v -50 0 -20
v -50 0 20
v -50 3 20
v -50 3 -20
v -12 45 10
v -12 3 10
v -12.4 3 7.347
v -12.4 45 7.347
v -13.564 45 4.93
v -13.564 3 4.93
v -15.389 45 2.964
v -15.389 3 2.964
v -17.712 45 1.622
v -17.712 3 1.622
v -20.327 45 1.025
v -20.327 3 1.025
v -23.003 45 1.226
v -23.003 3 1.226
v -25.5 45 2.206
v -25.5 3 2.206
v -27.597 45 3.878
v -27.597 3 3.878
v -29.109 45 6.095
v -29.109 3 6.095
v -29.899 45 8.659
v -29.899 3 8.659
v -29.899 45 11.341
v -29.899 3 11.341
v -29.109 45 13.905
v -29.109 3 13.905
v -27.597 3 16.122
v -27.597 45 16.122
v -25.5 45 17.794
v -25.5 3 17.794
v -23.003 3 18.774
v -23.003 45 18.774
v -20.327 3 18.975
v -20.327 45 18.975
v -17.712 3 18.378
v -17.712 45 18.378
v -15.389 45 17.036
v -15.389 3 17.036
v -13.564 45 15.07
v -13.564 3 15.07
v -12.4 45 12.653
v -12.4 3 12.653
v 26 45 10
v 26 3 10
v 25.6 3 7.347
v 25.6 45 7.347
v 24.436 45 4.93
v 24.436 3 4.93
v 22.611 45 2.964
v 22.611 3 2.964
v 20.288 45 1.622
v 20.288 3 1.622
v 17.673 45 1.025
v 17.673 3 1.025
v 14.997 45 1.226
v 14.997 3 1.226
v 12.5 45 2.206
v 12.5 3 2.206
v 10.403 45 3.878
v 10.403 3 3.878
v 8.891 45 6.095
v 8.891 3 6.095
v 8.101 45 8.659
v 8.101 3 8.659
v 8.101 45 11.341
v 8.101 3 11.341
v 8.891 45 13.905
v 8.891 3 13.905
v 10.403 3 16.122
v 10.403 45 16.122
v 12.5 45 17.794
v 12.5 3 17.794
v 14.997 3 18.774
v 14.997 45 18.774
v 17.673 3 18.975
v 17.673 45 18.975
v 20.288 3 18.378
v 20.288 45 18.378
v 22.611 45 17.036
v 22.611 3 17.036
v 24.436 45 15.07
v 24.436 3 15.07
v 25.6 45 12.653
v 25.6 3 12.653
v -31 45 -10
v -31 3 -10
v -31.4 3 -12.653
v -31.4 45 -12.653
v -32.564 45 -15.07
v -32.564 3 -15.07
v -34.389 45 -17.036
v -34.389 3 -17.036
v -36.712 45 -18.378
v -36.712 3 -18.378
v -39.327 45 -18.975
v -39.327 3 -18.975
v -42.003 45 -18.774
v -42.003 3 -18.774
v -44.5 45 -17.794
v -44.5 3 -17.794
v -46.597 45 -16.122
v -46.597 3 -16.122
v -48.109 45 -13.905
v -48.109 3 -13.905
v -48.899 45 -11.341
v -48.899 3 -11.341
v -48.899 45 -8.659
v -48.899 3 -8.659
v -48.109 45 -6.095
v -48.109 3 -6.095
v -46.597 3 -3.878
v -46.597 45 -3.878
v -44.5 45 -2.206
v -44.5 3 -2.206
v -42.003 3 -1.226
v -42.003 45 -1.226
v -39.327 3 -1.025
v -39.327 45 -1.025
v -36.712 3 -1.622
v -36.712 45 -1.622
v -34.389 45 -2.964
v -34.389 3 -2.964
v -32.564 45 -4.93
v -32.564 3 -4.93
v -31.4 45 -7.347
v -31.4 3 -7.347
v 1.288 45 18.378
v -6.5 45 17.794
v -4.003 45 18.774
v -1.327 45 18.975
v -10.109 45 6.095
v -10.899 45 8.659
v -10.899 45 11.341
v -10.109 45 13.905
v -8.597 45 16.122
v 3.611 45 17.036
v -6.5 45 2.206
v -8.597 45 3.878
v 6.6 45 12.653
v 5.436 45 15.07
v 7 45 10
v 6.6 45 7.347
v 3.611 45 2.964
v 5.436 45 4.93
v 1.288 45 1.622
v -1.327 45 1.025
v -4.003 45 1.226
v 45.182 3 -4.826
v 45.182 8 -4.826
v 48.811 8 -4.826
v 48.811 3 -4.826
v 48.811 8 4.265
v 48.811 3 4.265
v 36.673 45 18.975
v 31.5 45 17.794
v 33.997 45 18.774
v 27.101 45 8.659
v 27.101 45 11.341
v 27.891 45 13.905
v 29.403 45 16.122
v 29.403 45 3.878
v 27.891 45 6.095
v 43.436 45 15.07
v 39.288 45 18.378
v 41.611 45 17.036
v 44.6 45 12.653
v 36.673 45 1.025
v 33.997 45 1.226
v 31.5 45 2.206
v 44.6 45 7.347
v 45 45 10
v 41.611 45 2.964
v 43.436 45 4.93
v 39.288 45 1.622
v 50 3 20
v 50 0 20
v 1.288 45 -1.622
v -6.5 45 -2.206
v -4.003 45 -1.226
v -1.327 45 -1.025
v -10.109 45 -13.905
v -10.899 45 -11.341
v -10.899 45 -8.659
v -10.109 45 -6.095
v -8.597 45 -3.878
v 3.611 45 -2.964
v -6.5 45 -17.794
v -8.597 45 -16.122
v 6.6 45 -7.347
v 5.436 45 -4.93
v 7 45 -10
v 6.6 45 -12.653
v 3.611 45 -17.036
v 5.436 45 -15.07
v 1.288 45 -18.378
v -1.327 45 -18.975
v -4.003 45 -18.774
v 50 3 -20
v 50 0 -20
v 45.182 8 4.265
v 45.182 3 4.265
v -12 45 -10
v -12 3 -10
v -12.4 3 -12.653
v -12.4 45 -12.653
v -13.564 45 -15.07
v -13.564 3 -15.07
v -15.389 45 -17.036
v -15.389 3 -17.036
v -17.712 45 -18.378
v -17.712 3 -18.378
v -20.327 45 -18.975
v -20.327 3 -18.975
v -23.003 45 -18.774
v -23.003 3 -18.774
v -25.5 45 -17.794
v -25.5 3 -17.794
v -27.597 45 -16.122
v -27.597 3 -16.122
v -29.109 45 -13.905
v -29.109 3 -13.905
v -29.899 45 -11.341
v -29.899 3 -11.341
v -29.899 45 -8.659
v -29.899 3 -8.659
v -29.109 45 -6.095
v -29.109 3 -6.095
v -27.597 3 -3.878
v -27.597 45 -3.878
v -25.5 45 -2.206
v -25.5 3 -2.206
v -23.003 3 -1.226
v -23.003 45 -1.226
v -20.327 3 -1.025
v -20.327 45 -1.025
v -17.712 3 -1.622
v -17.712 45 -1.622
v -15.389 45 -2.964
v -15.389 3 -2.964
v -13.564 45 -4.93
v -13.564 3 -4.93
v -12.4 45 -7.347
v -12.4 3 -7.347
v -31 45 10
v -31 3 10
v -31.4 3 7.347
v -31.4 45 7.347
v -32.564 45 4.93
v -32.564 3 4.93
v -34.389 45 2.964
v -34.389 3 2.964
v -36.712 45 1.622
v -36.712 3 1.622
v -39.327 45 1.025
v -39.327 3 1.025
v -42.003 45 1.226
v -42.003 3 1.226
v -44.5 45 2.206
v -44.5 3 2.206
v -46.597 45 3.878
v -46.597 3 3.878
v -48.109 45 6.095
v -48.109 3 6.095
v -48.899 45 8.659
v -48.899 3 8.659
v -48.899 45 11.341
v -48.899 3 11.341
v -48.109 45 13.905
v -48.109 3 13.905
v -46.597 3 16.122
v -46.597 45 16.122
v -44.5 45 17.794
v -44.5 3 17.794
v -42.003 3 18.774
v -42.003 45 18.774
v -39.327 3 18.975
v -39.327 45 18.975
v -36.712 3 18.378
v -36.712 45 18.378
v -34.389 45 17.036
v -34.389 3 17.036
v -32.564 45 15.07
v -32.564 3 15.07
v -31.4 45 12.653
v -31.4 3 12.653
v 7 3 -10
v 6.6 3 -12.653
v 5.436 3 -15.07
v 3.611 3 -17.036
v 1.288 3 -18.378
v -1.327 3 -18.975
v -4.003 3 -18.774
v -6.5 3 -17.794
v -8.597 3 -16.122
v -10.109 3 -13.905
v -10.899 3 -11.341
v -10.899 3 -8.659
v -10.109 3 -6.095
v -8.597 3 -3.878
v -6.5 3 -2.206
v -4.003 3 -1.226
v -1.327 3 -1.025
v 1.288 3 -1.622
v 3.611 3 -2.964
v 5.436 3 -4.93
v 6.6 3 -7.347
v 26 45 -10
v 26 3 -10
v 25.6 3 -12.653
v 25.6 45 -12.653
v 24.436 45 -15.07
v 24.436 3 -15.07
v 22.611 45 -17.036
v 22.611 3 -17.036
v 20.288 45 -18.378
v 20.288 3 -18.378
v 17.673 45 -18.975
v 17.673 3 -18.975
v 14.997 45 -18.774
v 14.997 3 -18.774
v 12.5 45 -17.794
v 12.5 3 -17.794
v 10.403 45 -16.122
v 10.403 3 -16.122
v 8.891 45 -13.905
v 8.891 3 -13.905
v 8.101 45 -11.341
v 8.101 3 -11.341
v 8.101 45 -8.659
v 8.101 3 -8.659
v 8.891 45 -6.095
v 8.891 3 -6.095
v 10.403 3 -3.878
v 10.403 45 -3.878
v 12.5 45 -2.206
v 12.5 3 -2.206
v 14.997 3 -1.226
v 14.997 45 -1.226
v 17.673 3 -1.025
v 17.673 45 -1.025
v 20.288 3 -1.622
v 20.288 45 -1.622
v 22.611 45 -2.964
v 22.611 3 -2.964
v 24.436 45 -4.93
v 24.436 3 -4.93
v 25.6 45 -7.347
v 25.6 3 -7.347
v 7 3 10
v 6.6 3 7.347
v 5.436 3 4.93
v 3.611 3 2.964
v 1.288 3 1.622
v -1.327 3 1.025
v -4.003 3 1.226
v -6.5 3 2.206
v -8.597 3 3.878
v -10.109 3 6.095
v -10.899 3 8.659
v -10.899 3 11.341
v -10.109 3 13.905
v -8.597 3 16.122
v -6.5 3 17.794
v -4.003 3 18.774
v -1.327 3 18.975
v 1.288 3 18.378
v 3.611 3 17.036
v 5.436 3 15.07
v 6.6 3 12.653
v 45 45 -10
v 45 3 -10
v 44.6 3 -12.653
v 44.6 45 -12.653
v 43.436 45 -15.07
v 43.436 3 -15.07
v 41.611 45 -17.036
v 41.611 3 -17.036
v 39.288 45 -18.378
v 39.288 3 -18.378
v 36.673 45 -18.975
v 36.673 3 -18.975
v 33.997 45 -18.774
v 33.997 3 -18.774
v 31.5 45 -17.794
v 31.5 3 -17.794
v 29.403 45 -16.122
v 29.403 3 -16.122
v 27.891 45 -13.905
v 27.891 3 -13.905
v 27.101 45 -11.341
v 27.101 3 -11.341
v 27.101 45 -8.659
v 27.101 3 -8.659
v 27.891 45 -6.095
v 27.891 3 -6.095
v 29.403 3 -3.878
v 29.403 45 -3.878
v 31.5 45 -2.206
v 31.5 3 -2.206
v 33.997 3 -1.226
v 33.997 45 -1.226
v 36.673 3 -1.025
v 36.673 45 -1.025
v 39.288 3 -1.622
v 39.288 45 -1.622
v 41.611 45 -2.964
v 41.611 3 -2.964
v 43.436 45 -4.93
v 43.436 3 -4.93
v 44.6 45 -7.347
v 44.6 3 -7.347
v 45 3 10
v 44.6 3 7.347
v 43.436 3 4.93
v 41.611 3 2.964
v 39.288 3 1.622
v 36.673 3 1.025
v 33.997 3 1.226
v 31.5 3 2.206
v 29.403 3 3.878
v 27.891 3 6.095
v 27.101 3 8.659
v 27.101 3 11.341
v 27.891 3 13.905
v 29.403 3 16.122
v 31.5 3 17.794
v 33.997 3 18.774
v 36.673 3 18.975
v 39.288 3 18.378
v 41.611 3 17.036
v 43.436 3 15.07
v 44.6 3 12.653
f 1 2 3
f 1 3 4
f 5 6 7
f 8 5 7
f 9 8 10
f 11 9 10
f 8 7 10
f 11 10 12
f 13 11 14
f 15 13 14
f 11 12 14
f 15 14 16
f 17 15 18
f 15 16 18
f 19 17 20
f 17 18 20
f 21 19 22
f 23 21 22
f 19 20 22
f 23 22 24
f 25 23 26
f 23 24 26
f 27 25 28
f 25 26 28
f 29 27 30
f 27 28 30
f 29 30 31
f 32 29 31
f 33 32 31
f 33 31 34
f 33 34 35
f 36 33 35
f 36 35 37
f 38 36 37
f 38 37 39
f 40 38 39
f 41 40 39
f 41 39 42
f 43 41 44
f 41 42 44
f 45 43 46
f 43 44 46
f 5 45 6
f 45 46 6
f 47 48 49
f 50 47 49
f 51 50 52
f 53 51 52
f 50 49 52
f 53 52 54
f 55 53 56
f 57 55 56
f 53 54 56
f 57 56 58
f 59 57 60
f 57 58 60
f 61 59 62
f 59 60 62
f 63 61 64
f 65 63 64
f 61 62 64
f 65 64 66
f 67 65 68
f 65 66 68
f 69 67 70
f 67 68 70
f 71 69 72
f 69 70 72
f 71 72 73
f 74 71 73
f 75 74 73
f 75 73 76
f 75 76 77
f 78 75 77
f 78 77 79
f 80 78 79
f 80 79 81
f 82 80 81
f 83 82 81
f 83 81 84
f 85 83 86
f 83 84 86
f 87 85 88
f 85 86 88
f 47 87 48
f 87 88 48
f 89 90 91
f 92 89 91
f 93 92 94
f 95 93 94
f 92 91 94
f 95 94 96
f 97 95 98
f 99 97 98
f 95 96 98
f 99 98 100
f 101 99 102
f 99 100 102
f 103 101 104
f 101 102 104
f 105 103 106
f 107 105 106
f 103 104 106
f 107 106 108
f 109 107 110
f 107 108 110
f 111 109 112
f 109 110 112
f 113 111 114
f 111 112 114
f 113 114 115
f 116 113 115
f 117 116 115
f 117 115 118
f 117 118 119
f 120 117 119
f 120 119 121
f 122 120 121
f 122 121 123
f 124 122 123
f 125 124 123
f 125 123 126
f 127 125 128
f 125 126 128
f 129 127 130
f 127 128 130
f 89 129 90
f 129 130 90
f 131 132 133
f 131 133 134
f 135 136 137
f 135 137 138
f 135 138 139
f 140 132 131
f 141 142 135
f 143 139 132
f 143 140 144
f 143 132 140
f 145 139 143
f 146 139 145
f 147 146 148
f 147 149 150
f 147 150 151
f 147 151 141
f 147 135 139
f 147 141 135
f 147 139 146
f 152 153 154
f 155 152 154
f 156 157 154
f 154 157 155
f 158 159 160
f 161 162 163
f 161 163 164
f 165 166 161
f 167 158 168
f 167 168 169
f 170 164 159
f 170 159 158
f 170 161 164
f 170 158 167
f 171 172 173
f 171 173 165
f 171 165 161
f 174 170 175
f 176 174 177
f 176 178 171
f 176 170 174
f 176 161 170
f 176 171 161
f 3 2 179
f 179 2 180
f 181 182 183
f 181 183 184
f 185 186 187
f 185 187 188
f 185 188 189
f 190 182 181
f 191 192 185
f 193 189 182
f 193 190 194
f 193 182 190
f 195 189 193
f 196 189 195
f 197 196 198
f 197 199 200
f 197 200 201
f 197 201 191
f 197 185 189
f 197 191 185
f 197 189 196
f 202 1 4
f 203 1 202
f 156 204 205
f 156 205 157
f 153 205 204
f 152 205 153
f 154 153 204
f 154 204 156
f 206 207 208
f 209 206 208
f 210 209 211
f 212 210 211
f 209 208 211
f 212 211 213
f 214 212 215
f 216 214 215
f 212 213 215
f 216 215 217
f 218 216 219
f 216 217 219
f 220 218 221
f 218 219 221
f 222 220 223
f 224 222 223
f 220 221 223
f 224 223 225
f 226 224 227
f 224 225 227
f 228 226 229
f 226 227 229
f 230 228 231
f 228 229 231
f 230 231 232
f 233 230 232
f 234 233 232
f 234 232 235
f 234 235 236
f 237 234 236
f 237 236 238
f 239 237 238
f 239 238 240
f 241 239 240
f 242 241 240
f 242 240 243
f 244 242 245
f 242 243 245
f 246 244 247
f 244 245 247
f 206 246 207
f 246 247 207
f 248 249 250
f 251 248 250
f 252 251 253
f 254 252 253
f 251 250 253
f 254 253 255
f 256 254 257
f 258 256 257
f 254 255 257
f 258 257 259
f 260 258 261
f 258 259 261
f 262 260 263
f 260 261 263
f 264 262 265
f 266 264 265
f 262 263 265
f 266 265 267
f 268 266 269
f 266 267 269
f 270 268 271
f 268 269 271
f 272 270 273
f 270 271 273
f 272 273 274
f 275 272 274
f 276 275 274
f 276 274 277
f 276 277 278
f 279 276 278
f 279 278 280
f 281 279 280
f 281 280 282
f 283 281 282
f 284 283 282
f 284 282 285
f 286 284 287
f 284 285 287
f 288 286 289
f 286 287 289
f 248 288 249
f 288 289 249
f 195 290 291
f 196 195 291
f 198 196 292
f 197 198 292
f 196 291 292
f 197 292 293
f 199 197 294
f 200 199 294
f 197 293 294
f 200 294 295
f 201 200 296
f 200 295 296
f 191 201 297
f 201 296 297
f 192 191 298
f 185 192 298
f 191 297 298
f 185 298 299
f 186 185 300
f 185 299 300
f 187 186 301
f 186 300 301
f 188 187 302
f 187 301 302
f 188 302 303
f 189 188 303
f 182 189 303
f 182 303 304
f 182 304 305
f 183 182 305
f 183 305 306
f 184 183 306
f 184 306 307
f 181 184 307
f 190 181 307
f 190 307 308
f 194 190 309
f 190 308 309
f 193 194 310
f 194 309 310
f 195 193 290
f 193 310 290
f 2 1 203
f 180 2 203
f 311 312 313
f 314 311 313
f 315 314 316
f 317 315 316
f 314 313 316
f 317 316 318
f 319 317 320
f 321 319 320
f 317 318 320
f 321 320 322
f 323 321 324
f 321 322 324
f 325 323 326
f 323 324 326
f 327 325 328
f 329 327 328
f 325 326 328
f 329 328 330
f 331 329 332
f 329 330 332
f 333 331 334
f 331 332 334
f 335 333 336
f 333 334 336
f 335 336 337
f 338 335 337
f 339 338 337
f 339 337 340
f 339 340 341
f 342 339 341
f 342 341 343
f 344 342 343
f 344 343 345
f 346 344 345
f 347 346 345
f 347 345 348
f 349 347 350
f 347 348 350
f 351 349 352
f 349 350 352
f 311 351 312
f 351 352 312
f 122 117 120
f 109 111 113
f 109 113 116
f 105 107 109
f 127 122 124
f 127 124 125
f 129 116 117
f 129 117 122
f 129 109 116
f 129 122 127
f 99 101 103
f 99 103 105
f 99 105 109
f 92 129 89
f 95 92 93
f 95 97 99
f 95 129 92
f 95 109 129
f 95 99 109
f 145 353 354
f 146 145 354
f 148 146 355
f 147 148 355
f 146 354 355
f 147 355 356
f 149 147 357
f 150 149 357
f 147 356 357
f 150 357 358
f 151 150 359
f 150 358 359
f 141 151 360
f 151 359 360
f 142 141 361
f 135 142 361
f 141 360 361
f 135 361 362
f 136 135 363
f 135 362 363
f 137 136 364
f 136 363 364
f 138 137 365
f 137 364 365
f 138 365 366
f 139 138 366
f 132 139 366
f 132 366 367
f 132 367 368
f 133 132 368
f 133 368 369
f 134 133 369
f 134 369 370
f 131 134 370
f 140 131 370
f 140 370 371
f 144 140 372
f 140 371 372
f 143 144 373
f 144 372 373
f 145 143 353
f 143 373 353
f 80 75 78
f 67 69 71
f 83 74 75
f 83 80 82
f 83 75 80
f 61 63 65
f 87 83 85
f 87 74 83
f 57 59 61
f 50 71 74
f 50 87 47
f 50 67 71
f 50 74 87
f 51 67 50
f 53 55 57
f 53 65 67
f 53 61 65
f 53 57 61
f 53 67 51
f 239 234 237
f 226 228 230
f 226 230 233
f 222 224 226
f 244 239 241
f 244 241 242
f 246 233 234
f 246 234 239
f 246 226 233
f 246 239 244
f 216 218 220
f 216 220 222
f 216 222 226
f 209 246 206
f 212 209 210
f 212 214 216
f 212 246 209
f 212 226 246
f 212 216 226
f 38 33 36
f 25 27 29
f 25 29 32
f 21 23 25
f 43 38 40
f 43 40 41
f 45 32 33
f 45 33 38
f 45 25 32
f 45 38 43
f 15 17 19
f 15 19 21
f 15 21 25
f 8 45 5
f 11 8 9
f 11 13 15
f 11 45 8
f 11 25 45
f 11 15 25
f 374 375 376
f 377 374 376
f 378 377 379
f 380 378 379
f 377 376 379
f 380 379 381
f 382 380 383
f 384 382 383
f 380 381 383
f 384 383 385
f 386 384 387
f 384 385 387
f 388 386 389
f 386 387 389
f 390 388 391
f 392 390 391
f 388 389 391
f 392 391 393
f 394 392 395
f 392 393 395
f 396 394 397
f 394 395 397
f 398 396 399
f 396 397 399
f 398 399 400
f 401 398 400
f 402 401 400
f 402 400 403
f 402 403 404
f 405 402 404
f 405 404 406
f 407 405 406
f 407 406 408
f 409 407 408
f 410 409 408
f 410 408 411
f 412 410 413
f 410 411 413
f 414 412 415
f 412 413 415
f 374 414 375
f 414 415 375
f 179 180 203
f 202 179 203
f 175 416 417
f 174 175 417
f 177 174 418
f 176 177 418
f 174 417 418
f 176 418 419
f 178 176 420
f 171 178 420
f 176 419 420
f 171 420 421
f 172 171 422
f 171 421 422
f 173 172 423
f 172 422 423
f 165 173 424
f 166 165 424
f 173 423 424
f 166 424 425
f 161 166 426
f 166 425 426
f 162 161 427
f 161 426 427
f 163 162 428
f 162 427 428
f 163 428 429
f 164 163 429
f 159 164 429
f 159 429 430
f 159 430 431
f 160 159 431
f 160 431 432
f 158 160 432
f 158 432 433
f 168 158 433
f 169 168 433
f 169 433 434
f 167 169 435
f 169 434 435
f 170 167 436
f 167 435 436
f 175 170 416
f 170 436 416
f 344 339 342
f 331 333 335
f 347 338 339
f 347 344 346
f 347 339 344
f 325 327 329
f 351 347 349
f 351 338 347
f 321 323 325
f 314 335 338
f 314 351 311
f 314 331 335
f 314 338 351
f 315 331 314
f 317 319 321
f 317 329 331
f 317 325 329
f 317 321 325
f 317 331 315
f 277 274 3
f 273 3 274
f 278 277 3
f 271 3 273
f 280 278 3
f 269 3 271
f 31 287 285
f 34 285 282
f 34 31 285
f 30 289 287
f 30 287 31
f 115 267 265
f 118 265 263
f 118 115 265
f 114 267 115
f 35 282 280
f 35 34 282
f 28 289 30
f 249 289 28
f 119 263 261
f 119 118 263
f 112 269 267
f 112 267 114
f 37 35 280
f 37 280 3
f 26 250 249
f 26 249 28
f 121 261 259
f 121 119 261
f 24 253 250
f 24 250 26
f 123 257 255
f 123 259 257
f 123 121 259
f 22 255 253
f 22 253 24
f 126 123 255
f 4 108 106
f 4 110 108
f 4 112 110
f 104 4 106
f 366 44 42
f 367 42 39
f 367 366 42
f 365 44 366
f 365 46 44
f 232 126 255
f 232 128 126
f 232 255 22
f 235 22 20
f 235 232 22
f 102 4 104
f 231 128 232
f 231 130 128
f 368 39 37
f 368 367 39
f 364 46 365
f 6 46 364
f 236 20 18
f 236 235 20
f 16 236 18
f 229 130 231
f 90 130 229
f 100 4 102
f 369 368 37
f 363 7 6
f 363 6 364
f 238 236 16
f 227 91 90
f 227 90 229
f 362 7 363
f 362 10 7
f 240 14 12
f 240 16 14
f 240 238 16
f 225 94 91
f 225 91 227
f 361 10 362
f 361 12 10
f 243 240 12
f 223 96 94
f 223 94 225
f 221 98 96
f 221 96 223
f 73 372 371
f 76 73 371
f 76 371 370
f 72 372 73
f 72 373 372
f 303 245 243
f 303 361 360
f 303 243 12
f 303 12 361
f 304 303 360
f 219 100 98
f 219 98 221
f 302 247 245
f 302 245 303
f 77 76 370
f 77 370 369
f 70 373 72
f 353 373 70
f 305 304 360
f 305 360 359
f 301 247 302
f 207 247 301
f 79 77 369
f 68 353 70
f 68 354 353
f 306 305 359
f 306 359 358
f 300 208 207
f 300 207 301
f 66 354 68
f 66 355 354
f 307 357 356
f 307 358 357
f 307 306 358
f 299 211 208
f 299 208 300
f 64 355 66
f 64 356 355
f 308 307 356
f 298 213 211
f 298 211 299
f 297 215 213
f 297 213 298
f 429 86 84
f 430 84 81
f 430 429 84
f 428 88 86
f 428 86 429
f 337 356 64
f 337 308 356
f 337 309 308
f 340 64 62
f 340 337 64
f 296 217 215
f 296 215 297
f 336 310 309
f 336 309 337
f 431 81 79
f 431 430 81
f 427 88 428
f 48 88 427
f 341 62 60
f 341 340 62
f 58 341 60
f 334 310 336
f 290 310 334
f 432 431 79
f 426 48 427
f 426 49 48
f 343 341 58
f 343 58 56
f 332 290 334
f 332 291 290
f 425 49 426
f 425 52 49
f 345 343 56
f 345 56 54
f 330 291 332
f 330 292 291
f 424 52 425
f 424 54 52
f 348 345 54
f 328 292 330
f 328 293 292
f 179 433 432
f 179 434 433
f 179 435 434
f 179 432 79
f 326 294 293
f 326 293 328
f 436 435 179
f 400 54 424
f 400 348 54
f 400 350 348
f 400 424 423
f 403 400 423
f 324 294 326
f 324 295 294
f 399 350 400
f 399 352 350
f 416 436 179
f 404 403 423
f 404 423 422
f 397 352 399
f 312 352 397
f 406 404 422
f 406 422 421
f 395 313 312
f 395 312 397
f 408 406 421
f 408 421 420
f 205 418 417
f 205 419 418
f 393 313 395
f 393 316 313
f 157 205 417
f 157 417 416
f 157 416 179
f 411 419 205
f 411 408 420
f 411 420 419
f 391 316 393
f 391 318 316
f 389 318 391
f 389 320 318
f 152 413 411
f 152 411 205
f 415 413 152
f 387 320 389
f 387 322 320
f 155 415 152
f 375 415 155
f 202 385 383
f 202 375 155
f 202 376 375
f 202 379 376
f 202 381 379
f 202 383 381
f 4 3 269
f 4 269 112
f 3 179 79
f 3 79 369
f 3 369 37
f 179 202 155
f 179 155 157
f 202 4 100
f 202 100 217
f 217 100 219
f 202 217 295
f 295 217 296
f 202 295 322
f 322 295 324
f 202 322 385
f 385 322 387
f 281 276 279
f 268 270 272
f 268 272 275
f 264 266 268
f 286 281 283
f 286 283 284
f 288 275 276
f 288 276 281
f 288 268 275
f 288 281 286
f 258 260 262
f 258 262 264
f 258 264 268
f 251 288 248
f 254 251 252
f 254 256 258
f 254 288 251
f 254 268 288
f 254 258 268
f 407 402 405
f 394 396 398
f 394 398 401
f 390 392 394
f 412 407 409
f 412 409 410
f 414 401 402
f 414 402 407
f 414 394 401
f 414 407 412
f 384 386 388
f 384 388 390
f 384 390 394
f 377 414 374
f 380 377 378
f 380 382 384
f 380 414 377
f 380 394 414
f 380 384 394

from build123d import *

# Parameters (mm, degrees)
SKETCH_1_W      = 100
SKETCH_1_H      = 40
EXTRUDE_2_DEPTH = 3
SKETCH_2_R      = 9
EXTRUDE_3_DEPTH = 42
SKETCH_3_W      = 3.629615038
SKETCH_3_H      = 9.091657085
EXTRUDE_4_DEPTH = 5


with BuildPart() as part:
    # 草图1 → 凸台-拉伸2 (new body)
    with BuildSketch(Plane(origin=(0, 0, 0), x_dir=(1, 0, 0), z_dir=(0, 1, 0))):
        Rectangle(SKETCH_1_W, SKETCH_1_H)
    extrude(amount=EXTRUDE_2_DEPTH)

    # 草图2 → 凸台-拉伸3 (add)
    with BuildSketch(Plane(origin=(0, 3, 0), x_dir=(1, 0, 0), z_dir=(0, 1, 0))):
        with Locations((-40, -10)):
            Circle(SKETCH_2_R)
        with Locations((-21, -10)):
            Circle(SKETCH_2_R)
        with Locations((-2, -10)):
            Circle(SKETCH_2_R)
        with Locations((17, -10)):
            Circle(SKETCH_2_R)
        with Locations((36, -10)):
            Circle(SKETCH_2_R)
        with Locations((-21, 10)):
            Circle(SKETCH_2_R)
        with Locations((-2, 10)):
            Circle(SKETCH_2_R)
        with Locations((17, 10)):
            Circle(SKETCH_2_R)
        with Locations((36, 10)):
            Circle(SKETCH_2_R)
        with Locations((-40, 10)):
            Circle(SKETCH_2_R)
    extrude(amount=EXTRUDE_3_DEPTH)

    # 草图3 → 凸台-拉伸4 (add)
    with BuildSketch(Plane(origin=(0, 3, 0), x_dir=(1, 0, 0), z_dir=(0, 1, 0))):
        with Locations((46.996489689, 0.280393631)):
            Rectangle(SKETCH_3_W, SKETCH_3_H)
    extrude(amount=EXTRUDE_4_DEPTH)


solid = part.part
